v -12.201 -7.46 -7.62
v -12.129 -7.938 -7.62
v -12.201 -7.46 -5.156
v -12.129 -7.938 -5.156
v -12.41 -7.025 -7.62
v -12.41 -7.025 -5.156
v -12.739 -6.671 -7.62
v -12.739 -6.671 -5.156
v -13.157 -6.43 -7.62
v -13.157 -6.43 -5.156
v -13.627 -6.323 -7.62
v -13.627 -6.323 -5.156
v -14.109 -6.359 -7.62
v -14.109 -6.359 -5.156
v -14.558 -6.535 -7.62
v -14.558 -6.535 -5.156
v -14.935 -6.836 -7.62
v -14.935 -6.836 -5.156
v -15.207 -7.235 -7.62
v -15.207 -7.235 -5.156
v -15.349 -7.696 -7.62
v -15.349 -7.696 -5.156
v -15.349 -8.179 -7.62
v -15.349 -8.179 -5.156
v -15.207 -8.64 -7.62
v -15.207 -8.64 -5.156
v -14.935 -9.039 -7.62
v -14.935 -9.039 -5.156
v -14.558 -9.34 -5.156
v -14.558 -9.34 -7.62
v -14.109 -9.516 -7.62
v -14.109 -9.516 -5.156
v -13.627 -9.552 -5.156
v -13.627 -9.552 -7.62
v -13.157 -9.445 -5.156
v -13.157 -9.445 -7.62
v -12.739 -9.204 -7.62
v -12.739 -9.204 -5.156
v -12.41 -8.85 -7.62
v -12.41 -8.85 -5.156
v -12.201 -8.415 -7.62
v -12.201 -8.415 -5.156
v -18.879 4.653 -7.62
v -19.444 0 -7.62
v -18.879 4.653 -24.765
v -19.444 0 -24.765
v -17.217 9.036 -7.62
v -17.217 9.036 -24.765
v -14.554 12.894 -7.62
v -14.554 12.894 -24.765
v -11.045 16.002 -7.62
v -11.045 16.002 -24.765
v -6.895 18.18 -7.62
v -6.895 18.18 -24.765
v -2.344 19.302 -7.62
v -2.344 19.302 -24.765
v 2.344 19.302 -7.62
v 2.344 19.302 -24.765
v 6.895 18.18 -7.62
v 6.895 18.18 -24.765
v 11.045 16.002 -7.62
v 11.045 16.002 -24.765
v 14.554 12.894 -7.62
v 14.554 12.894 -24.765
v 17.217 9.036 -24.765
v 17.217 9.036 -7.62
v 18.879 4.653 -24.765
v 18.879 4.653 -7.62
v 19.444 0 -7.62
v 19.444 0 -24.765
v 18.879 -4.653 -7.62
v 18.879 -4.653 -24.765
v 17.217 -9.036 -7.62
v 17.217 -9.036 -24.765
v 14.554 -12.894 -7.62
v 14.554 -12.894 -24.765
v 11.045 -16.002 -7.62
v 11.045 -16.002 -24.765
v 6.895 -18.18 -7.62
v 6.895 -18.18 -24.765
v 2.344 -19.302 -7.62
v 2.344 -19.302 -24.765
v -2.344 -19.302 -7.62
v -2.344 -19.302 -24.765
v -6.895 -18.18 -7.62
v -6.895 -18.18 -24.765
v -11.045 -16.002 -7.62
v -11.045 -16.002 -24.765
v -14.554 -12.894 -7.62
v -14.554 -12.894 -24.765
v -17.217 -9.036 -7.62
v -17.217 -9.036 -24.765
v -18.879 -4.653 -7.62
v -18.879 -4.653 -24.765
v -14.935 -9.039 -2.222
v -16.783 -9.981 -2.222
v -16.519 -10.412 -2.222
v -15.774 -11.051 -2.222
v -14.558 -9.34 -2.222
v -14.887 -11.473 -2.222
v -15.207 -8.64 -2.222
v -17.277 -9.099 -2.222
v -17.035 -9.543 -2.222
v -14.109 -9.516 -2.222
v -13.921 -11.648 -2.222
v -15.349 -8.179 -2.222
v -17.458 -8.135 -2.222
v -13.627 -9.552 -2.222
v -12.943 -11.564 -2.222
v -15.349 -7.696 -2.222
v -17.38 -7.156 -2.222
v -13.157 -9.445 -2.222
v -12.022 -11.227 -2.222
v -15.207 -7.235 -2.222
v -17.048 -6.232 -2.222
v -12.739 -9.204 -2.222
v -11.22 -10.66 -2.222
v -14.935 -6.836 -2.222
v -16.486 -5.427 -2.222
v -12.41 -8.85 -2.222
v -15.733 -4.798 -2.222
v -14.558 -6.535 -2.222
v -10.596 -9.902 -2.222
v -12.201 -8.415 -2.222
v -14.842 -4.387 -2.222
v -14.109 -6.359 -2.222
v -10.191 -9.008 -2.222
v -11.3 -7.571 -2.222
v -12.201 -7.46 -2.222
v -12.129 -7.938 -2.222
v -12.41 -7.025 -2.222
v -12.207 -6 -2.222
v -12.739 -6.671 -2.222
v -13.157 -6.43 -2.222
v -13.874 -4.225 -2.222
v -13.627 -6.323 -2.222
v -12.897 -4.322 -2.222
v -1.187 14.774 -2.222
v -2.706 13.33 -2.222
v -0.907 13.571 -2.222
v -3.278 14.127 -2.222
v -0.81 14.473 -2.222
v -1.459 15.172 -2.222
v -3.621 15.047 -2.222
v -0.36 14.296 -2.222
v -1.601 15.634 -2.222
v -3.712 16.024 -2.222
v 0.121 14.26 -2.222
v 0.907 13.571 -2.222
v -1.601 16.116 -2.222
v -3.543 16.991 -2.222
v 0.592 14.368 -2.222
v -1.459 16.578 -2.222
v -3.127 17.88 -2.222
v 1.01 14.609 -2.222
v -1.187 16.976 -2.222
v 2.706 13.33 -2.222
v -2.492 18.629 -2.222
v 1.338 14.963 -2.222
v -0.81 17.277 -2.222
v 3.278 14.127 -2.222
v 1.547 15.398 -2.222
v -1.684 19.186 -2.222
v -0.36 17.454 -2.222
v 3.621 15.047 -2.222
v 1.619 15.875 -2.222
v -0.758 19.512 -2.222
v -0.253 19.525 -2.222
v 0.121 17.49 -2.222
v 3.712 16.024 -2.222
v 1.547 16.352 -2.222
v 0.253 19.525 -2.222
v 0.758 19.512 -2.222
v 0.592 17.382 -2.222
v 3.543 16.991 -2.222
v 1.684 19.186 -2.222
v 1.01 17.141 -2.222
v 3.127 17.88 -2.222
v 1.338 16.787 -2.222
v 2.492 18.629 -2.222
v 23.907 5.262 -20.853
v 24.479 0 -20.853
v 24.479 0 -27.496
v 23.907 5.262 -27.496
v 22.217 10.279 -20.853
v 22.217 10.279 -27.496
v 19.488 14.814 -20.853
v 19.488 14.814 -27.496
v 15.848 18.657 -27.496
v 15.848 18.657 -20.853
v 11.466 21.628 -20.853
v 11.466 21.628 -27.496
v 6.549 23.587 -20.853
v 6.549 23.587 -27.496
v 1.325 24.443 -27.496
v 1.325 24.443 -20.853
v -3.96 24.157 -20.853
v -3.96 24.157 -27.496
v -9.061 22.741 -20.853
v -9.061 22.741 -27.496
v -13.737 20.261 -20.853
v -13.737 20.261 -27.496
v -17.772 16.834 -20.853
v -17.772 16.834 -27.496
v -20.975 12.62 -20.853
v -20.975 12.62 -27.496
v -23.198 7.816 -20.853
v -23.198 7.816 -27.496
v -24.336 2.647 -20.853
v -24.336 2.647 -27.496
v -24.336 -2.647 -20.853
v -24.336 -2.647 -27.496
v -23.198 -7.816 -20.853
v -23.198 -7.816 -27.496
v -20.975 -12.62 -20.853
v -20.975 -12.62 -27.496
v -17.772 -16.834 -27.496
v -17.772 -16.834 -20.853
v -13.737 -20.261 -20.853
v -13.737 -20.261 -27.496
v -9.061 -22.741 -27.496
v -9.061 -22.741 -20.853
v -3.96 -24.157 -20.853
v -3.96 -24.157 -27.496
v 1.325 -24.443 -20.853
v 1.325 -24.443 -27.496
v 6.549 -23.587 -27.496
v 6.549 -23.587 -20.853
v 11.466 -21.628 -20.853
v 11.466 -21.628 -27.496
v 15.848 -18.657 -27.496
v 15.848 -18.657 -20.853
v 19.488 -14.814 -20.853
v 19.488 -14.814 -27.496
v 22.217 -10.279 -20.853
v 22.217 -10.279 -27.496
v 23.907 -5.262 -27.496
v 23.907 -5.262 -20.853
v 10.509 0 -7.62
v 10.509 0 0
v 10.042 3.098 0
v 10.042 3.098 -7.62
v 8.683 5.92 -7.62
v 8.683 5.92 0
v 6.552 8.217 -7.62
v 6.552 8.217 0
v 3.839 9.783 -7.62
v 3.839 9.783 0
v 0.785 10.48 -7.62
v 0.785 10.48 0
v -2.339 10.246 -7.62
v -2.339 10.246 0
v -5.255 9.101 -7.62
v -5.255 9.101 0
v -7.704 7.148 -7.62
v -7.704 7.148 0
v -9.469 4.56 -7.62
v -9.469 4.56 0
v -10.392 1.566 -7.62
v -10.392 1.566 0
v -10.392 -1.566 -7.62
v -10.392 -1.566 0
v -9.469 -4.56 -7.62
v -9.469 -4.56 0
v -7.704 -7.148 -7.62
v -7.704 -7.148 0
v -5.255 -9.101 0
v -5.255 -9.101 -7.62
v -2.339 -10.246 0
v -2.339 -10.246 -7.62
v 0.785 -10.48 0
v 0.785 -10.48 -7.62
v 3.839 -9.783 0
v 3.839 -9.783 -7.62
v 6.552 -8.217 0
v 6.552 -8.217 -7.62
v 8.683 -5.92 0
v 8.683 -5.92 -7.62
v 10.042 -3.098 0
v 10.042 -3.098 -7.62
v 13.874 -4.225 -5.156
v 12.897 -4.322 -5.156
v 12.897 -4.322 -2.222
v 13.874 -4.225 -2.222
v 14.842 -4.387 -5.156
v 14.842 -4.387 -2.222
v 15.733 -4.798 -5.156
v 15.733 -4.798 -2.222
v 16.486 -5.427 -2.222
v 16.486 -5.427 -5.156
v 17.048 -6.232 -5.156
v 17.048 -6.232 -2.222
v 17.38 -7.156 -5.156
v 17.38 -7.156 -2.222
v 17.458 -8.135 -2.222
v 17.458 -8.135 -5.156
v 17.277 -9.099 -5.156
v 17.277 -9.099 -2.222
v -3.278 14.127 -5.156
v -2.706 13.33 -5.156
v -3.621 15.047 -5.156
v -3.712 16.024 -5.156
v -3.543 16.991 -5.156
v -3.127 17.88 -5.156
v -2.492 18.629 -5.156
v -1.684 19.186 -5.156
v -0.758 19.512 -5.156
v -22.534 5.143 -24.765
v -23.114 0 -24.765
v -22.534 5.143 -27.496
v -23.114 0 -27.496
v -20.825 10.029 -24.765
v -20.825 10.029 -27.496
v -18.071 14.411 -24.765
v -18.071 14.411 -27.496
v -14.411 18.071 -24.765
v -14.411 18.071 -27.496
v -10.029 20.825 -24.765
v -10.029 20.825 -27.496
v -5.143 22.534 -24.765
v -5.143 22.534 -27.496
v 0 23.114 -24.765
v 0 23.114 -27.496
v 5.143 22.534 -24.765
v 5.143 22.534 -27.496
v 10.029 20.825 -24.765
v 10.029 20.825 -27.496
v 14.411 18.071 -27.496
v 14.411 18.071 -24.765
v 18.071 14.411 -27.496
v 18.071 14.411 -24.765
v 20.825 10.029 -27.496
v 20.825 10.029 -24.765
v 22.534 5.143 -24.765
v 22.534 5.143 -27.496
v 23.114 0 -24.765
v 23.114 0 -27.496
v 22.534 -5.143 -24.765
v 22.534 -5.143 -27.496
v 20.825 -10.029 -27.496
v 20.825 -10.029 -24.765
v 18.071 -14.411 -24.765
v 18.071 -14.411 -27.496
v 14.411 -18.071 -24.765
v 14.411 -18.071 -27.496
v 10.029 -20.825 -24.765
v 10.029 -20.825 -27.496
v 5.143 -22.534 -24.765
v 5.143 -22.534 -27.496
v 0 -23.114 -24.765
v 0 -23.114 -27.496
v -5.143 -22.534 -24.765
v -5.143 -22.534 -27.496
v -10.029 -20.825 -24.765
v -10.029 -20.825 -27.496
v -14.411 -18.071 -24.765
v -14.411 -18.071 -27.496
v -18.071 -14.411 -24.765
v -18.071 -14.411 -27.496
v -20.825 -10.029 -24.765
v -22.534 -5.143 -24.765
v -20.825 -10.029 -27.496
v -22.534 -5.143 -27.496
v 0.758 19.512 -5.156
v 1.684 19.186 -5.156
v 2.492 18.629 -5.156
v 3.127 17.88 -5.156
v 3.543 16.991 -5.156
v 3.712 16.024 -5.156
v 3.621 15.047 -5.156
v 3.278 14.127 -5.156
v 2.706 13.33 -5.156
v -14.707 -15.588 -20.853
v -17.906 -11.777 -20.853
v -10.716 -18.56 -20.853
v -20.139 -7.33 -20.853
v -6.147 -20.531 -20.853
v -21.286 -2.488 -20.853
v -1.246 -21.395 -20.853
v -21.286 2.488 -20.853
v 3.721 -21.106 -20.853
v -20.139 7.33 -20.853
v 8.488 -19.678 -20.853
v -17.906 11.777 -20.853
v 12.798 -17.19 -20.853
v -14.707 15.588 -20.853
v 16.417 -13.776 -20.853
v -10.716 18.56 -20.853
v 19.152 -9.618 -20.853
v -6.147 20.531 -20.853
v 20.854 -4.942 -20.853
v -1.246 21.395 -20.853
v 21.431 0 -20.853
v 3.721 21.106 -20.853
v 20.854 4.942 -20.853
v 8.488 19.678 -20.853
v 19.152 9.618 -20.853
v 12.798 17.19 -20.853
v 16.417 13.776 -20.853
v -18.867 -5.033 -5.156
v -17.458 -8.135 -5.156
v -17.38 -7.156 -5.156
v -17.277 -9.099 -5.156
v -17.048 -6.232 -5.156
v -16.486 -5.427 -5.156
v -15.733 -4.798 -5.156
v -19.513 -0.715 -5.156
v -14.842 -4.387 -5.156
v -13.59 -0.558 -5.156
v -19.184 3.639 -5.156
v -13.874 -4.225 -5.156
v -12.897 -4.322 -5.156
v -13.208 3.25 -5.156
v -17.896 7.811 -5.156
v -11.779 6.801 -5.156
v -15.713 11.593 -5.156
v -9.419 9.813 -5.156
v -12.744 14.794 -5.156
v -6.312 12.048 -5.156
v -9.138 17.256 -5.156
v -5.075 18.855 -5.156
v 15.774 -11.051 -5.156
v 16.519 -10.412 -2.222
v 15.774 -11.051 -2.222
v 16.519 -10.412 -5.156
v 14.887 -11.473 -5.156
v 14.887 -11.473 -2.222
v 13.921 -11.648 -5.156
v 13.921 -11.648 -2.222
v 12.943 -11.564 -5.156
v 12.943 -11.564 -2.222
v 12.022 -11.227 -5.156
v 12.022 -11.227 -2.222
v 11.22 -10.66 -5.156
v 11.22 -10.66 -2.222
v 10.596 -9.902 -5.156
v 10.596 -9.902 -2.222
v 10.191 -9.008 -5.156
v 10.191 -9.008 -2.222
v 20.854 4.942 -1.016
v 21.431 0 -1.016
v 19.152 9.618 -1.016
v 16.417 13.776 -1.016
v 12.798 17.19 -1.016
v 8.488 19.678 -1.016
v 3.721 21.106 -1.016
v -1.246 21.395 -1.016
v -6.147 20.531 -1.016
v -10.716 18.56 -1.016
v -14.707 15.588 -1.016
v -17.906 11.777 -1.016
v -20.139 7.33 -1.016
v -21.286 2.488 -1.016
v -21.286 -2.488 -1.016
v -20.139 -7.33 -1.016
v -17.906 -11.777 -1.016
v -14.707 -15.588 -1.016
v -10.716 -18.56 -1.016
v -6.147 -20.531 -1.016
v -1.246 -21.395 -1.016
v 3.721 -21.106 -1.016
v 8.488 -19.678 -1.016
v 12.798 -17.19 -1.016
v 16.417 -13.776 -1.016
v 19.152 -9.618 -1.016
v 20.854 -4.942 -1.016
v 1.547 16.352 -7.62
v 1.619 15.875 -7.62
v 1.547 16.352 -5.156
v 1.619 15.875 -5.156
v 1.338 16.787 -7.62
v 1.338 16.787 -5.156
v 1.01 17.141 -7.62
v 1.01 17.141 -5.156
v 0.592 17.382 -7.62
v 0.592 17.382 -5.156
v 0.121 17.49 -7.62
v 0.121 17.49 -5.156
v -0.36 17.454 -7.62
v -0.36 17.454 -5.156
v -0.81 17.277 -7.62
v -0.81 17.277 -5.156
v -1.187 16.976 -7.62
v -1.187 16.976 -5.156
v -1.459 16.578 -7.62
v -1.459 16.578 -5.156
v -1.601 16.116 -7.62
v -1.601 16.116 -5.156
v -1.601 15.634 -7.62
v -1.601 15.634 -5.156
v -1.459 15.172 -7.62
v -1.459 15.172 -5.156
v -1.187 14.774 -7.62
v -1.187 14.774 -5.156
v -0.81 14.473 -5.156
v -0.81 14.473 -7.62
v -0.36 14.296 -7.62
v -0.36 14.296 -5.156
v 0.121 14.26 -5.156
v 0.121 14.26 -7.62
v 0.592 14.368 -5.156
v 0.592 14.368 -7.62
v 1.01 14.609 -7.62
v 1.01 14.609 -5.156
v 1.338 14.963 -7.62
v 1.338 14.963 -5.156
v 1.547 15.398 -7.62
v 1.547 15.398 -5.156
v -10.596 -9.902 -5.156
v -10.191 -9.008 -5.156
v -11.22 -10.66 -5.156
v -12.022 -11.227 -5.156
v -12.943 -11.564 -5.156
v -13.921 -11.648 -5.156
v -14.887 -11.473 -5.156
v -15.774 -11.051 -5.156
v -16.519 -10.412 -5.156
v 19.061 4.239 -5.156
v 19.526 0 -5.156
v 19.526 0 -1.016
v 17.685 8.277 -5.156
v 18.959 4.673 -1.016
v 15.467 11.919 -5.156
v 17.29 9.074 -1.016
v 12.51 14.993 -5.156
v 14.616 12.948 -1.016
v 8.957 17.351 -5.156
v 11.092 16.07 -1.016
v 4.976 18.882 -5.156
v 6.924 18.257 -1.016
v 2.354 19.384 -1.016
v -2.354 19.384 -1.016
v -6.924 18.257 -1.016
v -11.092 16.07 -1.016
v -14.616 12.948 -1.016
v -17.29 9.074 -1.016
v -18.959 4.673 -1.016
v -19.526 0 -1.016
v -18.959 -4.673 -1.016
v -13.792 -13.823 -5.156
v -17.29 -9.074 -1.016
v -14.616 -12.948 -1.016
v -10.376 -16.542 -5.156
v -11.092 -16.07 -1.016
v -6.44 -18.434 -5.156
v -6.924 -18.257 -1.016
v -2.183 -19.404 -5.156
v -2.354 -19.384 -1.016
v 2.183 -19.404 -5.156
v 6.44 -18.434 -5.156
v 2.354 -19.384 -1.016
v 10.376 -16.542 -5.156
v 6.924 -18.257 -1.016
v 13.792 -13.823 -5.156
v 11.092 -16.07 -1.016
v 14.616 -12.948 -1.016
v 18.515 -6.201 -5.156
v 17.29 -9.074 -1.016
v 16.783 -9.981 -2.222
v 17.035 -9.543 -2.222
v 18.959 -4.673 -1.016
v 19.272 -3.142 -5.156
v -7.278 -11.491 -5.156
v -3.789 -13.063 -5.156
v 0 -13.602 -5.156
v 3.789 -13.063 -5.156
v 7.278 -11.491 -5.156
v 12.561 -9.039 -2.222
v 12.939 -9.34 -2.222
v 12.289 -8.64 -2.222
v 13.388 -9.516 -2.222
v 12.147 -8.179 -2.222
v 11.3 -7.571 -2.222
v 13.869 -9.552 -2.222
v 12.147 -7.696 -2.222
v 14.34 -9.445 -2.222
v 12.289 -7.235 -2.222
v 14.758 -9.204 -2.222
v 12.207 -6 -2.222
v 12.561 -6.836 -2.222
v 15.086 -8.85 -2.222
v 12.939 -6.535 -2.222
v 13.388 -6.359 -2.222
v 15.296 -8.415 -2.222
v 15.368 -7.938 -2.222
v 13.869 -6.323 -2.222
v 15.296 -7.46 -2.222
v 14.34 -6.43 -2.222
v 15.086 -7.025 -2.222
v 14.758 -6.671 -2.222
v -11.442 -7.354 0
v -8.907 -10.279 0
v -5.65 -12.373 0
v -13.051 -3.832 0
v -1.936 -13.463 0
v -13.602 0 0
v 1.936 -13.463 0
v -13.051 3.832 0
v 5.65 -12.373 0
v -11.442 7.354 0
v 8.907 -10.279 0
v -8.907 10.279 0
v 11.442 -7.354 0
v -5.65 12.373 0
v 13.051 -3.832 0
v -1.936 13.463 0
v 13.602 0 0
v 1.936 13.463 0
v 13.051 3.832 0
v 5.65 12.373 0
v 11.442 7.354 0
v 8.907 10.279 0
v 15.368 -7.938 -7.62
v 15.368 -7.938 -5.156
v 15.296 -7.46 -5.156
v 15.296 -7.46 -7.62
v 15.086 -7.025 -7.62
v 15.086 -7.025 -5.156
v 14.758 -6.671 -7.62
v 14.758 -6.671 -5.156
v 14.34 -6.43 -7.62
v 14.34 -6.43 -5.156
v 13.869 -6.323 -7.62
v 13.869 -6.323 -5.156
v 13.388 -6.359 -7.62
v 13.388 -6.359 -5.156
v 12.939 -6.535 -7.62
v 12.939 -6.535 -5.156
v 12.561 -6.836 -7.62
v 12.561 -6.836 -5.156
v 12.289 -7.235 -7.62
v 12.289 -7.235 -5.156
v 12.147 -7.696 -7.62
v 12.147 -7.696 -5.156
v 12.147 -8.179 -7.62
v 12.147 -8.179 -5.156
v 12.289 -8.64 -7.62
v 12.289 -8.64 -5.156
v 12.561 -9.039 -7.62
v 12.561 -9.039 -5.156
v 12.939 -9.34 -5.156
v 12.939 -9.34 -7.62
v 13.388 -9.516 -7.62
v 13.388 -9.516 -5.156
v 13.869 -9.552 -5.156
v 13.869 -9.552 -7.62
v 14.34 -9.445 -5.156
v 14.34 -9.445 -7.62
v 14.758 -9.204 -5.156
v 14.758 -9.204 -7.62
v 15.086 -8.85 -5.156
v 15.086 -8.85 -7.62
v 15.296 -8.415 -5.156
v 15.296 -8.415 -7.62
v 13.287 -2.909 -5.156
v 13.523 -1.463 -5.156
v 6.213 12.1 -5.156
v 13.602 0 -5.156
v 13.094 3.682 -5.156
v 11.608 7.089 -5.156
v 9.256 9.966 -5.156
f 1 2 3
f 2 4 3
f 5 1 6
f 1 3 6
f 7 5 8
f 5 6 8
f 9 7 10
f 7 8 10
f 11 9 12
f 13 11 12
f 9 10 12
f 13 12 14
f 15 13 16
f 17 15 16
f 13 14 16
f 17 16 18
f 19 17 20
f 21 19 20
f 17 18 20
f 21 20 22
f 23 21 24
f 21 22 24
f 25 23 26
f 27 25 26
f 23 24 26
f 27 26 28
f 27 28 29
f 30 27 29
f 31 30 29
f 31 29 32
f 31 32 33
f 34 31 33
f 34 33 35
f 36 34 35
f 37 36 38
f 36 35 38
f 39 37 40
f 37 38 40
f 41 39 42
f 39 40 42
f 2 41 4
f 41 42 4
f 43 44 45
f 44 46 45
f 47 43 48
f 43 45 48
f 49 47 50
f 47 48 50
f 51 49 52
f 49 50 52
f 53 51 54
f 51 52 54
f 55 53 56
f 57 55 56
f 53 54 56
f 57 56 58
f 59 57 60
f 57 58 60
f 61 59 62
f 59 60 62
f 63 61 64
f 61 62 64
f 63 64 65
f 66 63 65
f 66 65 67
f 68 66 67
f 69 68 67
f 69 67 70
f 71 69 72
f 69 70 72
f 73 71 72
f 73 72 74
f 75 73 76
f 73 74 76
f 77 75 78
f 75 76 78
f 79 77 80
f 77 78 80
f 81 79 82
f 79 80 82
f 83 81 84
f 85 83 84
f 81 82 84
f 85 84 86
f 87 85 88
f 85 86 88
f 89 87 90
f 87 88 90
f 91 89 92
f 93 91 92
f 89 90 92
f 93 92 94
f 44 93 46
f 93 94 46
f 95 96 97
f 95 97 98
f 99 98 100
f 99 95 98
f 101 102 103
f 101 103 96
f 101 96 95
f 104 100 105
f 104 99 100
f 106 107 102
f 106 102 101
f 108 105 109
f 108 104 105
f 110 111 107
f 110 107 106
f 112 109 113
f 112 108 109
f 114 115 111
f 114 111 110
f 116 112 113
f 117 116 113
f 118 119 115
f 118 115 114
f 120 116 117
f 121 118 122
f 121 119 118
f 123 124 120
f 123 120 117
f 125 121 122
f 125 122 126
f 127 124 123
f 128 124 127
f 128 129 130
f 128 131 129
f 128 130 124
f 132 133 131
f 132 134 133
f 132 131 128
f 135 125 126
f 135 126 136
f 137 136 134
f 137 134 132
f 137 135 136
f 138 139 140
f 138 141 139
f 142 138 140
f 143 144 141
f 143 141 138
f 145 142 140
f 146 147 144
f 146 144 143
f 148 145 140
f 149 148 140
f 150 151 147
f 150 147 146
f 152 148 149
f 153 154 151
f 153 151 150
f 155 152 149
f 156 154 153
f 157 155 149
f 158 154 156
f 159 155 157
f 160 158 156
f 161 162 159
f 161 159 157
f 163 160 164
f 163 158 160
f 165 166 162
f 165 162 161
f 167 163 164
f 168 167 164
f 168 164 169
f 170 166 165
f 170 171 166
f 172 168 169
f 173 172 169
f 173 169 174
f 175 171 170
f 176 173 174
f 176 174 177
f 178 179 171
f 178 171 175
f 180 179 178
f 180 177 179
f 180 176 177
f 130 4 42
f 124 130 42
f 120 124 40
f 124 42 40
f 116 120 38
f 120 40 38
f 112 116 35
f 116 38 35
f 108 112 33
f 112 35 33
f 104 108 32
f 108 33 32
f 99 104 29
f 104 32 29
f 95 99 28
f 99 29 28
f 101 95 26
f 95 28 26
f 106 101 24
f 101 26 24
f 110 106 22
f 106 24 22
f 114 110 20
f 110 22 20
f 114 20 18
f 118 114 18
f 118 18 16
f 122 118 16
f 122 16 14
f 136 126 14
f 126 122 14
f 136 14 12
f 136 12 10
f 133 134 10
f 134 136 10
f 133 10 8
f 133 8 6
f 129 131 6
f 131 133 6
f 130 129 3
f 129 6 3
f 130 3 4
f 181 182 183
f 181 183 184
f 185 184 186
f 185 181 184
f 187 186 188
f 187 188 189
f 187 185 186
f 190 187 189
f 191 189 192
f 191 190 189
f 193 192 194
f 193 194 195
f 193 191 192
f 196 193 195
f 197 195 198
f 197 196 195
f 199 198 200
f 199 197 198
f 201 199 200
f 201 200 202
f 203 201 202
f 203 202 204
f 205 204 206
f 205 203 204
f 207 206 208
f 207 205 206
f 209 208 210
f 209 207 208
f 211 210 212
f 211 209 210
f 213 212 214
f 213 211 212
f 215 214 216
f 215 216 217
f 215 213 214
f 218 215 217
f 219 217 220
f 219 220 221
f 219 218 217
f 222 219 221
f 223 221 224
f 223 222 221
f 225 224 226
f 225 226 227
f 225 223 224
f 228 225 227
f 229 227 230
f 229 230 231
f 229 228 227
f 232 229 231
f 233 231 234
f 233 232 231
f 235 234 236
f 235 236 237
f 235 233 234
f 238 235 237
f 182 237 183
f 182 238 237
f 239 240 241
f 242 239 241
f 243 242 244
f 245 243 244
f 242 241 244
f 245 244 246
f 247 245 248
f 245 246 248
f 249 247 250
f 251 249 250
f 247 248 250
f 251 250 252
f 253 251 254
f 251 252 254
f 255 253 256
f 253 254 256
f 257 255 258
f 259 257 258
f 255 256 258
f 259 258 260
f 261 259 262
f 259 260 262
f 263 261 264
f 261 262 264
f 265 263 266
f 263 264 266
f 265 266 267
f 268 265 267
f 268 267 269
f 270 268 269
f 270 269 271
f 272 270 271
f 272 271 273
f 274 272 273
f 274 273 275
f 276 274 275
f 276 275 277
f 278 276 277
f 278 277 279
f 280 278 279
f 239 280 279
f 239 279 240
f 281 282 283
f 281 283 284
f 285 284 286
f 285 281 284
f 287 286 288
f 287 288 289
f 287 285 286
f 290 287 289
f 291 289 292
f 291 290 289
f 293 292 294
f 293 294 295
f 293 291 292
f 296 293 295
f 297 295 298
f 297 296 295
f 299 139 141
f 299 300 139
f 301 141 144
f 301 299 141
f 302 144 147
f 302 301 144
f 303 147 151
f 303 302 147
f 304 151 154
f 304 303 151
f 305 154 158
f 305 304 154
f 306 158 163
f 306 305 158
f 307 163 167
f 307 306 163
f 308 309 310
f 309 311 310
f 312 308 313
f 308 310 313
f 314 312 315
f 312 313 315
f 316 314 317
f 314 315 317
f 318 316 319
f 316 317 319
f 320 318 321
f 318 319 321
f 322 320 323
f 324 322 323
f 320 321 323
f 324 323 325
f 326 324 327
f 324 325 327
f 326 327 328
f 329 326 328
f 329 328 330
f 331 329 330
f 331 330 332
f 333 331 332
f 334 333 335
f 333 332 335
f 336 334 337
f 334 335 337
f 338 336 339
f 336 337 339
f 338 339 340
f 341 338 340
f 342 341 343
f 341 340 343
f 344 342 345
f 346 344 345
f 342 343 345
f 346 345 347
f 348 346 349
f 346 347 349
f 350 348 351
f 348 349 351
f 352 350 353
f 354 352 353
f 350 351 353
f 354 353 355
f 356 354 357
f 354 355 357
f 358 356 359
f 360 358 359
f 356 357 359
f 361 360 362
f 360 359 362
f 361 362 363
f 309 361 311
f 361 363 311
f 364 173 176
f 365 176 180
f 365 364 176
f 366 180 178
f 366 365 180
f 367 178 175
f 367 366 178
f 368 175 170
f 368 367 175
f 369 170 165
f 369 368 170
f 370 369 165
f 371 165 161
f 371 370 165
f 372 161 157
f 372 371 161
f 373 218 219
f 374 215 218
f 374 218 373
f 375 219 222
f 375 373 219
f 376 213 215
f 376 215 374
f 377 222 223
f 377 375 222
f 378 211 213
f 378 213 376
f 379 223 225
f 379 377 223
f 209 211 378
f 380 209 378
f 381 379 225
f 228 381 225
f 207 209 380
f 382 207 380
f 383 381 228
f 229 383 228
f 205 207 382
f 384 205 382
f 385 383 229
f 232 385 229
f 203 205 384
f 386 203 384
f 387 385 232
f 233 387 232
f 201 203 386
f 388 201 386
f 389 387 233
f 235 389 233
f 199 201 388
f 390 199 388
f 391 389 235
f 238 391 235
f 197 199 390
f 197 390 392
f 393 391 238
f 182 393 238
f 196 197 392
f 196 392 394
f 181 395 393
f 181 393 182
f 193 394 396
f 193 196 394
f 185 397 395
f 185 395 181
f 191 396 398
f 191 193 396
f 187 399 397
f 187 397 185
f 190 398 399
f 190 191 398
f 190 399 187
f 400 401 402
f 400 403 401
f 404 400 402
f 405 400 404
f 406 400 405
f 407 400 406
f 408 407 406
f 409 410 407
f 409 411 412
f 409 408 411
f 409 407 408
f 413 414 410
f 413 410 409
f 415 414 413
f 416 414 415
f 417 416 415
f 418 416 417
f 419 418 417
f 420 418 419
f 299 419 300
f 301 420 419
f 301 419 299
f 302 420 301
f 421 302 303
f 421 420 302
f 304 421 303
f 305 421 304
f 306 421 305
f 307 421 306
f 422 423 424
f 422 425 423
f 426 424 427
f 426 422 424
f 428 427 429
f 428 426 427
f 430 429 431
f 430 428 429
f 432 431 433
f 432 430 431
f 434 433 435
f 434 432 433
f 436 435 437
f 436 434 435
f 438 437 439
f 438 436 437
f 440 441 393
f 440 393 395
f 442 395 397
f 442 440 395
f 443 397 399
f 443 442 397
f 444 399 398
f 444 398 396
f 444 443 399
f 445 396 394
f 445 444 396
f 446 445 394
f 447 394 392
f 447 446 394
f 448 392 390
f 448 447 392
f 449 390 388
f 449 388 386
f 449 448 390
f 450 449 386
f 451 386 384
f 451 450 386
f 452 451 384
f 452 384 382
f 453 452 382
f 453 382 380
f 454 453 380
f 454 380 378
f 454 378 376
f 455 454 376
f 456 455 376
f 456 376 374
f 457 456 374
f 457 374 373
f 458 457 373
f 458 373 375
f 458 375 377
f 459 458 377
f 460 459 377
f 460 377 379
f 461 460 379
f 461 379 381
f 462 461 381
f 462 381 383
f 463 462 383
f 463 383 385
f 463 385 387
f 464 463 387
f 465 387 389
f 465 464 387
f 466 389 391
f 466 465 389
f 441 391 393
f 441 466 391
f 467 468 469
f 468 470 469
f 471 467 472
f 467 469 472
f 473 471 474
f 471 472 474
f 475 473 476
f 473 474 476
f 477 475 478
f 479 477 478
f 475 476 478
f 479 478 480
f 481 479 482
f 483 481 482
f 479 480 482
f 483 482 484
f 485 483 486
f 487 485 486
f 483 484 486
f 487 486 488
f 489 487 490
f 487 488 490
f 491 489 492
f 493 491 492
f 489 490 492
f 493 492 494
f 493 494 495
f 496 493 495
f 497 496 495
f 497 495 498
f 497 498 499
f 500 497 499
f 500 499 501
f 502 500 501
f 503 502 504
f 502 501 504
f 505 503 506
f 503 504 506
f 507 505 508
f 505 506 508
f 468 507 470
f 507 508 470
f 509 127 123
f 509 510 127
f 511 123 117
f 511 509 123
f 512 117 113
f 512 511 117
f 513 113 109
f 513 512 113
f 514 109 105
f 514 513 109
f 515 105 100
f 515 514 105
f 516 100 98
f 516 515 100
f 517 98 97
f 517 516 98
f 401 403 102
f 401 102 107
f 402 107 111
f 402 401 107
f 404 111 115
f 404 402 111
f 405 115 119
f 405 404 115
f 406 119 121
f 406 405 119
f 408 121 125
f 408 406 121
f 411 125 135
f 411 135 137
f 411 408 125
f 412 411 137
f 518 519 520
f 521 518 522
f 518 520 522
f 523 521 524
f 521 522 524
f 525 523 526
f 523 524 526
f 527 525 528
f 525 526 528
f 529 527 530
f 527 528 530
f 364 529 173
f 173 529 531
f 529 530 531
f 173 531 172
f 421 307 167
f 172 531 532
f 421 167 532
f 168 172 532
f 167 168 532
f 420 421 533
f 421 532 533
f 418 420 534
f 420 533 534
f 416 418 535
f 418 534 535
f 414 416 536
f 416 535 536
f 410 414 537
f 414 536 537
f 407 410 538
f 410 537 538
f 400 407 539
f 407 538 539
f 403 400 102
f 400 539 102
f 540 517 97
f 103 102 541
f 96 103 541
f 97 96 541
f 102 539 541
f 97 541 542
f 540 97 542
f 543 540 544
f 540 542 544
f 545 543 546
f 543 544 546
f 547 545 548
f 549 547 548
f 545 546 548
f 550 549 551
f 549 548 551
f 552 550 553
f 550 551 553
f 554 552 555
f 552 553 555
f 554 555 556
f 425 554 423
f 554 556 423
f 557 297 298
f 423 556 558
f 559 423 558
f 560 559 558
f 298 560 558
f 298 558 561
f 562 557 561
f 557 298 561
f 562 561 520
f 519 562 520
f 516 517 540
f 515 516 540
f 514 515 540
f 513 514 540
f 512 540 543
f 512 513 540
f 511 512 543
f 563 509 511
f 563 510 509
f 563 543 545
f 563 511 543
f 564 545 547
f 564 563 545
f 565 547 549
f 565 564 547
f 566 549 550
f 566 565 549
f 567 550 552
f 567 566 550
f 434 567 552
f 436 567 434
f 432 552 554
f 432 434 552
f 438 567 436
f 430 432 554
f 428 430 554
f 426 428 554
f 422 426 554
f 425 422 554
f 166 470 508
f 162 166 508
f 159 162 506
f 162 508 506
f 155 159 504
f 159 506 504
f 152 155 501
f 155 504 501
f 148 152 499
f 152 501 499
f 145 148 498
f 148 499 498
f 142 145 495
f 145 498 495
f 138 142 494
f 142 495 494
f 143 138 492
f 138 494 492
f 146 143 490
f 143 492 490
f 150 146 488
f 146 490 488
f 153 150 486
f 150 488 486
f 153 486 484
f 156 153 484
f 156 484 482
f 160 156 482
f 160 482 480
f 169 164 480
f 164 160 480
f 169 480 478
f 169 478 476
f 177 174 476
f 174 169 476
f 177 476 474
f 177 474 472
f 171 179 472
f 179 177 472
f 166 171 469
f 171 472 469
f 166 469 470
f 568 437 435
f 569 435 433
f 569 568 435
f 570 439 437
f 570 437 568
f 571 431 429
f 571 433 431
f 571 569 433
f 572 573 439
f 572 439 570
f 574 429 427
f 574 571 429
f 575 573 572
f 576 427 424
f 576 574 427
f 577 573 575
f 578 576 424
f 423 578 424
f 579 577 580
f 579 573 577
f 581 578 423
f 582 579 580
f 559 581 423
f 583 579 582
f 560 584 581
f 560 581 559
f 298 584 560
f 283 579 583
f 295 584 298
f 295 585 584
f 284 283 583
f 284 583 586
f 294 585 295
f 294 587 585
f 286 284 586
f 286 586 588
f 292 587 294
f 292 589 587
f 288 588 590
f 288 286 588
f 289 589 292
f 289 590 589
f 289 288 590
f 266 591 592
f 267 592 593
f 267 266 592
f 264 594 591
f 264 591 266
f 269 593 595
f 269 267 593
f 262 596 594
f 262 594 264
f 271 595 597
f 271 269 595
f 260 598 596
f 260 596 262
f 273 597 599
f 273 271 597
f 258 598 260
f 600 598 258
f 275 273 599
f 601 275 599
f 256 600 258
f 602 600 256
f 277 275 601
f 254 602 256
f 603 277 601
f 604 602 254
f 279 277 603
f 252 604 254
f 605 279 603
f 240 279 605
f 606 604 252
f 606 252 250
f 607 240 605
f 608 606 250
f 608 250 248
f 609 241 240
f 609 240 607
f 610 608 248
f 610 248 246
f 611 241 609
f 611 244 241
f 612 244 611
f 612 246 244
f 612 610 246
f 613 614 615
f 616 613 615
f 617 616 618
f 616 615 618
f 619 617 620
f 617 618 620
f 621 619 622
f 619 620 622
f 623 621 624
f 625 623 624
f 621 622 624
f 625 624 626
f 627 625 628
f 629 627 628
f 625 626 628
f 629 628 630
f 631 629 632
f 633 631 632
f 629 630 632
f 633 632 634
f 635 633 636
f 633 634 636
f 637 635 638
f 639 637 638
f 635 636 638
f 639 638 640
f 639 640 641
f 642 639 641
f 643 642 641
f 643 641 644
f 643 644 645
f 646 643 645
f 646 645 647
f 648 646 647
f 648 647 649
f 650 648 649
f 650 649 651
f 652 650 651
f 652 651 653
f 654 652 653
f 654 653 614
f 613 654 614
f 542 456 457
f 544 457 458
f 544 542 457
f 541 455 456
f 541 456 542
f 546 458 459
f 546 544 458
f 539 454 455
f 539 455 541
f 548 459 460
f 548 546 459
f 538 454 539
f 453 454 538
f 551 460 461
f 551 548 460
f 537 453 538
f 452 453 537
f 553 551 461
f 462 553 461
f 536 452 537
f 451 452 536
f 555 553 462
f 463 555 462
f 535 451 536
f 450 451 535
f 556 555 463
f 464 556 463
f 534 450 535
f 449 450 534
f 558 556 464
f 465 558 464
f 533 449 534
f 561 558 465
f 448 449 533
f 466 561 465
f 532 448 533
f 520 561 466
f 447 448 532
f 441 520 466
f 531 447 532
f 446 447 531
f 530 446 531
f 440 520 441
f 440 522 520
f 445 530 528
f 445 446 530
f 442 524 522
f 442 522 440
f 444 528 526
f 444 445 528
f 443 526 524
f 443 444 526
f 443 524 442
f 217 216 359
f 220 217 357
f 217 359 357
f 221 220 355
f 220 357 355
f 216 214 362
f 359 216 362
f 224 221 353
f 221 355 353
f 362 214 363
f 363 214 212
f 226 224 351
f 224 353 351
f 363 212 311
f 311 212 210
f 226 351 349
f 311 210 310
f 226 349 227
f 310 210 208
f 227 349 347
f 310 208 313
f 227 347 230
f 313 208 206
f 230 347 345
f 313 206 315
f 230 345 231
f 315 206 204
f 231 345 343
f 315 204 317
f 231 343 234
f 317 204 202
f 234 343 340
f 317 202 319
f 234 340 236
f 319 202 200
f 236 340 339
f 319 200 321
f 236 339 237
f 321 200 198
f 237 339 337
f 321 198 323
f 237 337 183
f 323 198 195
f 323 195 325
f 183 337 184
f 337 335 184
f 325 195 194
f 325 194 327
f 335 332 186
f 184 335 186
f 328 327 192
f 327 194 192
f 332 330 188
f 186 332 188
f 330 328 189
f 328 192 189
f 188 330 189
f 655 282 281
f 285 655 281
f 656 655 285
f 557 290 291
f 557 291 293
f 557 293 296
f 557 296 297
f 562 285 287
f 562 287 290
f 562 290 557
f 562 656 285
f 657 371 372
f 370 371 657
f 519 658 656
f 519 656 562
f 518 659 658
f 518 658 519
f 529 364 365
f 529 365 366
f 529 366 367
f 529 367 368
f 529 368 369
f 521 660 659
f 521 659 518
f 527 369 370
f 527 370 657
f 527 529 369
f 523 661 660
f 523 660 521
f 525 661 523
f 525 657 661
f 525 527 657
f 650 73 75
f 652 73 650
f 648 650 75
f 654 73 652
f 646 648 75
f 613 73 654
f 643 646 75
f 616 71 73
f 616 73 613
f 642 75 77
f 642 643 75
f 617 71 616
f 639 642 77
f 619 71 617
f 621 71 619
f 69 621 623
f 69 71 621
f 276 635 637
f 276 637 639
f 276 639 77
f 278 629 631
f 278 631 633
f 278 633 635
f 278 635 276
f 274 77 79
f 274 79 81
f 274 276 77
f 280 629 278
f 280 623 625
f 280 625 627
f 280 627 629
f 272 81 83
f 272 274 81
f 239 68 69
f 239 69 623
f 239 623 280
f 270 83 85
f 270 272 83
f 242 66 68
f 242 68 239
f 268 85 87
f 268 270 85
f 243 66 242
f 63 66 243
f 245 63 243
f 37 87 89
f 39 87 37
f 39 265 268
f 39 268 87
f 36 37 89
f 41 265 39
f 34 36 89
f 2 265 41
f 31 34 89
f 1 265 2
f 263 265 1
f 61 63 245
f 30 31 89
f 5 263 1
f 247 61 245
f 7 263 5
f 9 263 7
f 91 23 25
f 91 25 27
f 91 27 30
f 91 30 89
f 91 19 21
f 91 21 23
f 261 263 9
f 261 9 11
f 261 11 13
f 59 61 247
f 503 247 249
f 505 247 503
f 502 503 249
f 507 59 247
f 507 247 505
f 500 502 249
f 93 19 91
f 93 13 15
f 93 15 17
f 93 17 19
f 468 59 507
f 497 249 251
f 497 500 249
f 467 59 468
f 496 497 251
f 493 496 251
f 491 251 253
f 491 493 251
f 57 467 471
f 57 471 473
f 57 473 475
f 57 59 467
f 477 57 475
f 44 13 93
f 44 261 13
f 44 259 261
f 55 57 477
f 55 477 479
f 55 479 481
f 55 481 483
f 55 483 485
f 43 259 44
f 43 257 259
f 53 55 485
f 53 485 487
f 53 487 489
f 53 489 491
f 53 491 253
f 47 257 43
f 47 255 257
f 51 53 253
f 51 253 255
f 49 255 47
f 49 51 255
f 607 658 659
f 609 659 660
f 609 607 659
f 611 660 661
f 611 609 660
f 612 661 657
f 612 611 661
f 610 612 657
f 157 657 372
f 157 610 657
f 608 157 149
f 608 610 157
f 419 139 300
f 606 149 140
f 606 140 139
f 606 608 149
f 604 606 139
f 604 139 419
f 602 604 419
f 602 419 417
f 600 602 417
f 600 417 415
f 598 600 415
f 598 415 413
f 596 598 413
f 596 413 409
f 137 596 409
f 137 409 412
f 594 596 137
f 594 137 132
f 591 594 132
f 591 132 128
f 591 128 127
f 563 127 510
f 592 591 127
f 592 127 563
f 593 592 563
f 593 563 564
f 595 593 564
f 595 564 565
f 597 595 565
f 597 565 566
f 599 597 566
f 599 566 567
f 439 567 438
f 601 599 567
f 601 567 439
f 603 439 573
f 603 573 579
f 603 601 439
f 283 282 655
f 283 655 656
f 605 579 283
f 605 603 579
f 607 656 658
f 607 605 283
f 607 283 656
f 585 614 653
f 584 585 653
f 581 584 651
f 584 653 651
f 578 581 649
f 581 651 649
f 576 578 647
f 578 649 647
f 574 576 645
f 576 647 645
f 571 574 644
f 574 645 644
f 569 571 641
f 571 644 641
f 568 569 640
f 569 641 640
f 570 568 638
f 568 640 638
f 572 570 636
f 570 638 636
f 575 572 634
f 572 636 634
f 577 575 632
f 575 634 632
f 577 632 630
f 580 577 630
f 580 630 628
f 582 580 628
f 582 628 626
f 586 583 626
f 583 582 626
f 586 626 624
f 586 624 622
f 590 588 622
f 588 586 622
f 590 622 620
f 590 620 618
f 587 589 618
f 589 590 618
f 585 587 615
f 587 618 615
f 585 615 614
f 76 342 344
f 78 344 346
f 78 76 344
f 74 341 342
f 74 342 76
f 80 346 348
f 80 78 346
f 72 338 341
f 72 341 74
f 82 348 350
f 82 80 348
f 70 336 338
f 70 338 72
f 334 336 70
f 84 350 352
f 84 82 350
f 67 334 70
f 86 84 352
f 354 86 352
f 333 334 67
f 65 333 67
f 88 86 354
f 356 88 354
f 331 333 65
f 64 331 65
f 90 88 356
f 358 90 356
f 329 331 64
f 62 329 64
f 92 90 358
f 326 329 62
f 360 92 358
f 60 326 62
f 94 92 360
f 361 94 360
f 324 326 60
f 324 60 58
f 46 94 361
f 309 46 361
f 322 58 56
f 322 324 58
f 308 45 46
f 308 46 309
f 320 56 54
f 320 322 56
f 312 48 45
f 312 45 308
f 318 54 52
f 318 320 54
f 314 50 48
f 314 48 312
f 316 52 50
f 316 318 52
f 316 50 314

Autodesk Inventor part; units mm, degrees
ref_plane "YZ Plane" through (0, 0, 0) normal (1, 0, 0) x (0, 1, 0)
ref_plane "XZ Plane" through (0, 0, 0) normal (0, 1, 0) x (-1, 0, 0)
ref_plane "XY Plane" through (0, 0, 0) normal (0, 0, 1) x (1, 0, 0)
sketch "Sketch1" plane through (0, 0, 0) normal (0, 0, 1) x (1, 0, 0)
  circle A0 centre (0, 0) radius 24.4793
  circle A1 centre (0, 0) radius 21.4312
  circle A2 centre (0, 0) radius 19.5263
  circle A3 centre (0, 0) radius 13.6017
  circle A4 centre (0, 0) radius 10.5093
  dimension "d0" = 48.9585
  dimension "d1" = 42.8625
  dimension "d2" = 39.0525
  dimension "d3" = 27.2034
  dimension "d4" = 21.0185
extrude "Extrusion1" add sketch "Sketch1" against normal blind 27.4955 contours A0 | A1 | A2 | A3
extrude "Extrusion2" cut sketch "Sketch1" against normal blind 20.8534 contours A0
extrude "Extrusion3" cut sketch "Sketch1" against normal blind 5.1562 contours A2
extrude "Extrusion4" cut sketch "Sketch1" against normal blind 1.016 contours A1
sketch "Sketch2" plane through (0, 0, -5.1562) normal (0, 0, 1) x (1, 0, 0)
  circle A0 centre (0, 0) radius 13.6017 projected
  circle A1 centre (0, 15.875) radius 1.6193
  circle A2 centre (0, 15.875) radius 3.7147
  circle A3 centre (-13.7482, -7.9375) radius 1.6193
  circle A4 centre (-13.7482, -7.9375) radius 3.7147
  circle A5 centre (13.7482, -7.9375) radius 1.6193
  circle A6 centre (13.7482, -7.9375) radius 3.7147
  dimension "d13" = 3.2385
  dimension "d14" = 7.4295
  dimension "d15" = 15.875
  dimension "d18" = 360
extrude "Extrusion5" add sketch "Sketch2" along normal blind 2.9337 contours A2 A0 | A0 A2 | A6 A0 | A0 A6 | A4 A0 | A0 A4
sketch "Sketch3" plane through (0, 0, -27.4955) normal (0, 0, -1) x (-1, 0, 0)
  circle A0 centre (0, 0) radius 10.5093 projected
  circle A1 centre (0, 0) radius 24.4793 projected
  circle A2 centre (0, 0) radius 23.114
  circle A3 centre (0, 0) radius 19.4437
  circle A4 centre (0, 0) radius 24.4793
  dimension "d22" = 46.228
  dimension "d23" = 38.8874
extrude "Extrusion6" cut sketch "Sketch3" against normal blind 19.8755 contours A3
extrude "Extrusion7" cut sketch "Sketch3" against normal blind 2.7305 contours A2
extrude "Extrusion8" cut sketch "Sketch2" against normal through all contours A1 | A3 | A5
properties part number "Drill Dap 1.6925 D Dewalt XRP"
